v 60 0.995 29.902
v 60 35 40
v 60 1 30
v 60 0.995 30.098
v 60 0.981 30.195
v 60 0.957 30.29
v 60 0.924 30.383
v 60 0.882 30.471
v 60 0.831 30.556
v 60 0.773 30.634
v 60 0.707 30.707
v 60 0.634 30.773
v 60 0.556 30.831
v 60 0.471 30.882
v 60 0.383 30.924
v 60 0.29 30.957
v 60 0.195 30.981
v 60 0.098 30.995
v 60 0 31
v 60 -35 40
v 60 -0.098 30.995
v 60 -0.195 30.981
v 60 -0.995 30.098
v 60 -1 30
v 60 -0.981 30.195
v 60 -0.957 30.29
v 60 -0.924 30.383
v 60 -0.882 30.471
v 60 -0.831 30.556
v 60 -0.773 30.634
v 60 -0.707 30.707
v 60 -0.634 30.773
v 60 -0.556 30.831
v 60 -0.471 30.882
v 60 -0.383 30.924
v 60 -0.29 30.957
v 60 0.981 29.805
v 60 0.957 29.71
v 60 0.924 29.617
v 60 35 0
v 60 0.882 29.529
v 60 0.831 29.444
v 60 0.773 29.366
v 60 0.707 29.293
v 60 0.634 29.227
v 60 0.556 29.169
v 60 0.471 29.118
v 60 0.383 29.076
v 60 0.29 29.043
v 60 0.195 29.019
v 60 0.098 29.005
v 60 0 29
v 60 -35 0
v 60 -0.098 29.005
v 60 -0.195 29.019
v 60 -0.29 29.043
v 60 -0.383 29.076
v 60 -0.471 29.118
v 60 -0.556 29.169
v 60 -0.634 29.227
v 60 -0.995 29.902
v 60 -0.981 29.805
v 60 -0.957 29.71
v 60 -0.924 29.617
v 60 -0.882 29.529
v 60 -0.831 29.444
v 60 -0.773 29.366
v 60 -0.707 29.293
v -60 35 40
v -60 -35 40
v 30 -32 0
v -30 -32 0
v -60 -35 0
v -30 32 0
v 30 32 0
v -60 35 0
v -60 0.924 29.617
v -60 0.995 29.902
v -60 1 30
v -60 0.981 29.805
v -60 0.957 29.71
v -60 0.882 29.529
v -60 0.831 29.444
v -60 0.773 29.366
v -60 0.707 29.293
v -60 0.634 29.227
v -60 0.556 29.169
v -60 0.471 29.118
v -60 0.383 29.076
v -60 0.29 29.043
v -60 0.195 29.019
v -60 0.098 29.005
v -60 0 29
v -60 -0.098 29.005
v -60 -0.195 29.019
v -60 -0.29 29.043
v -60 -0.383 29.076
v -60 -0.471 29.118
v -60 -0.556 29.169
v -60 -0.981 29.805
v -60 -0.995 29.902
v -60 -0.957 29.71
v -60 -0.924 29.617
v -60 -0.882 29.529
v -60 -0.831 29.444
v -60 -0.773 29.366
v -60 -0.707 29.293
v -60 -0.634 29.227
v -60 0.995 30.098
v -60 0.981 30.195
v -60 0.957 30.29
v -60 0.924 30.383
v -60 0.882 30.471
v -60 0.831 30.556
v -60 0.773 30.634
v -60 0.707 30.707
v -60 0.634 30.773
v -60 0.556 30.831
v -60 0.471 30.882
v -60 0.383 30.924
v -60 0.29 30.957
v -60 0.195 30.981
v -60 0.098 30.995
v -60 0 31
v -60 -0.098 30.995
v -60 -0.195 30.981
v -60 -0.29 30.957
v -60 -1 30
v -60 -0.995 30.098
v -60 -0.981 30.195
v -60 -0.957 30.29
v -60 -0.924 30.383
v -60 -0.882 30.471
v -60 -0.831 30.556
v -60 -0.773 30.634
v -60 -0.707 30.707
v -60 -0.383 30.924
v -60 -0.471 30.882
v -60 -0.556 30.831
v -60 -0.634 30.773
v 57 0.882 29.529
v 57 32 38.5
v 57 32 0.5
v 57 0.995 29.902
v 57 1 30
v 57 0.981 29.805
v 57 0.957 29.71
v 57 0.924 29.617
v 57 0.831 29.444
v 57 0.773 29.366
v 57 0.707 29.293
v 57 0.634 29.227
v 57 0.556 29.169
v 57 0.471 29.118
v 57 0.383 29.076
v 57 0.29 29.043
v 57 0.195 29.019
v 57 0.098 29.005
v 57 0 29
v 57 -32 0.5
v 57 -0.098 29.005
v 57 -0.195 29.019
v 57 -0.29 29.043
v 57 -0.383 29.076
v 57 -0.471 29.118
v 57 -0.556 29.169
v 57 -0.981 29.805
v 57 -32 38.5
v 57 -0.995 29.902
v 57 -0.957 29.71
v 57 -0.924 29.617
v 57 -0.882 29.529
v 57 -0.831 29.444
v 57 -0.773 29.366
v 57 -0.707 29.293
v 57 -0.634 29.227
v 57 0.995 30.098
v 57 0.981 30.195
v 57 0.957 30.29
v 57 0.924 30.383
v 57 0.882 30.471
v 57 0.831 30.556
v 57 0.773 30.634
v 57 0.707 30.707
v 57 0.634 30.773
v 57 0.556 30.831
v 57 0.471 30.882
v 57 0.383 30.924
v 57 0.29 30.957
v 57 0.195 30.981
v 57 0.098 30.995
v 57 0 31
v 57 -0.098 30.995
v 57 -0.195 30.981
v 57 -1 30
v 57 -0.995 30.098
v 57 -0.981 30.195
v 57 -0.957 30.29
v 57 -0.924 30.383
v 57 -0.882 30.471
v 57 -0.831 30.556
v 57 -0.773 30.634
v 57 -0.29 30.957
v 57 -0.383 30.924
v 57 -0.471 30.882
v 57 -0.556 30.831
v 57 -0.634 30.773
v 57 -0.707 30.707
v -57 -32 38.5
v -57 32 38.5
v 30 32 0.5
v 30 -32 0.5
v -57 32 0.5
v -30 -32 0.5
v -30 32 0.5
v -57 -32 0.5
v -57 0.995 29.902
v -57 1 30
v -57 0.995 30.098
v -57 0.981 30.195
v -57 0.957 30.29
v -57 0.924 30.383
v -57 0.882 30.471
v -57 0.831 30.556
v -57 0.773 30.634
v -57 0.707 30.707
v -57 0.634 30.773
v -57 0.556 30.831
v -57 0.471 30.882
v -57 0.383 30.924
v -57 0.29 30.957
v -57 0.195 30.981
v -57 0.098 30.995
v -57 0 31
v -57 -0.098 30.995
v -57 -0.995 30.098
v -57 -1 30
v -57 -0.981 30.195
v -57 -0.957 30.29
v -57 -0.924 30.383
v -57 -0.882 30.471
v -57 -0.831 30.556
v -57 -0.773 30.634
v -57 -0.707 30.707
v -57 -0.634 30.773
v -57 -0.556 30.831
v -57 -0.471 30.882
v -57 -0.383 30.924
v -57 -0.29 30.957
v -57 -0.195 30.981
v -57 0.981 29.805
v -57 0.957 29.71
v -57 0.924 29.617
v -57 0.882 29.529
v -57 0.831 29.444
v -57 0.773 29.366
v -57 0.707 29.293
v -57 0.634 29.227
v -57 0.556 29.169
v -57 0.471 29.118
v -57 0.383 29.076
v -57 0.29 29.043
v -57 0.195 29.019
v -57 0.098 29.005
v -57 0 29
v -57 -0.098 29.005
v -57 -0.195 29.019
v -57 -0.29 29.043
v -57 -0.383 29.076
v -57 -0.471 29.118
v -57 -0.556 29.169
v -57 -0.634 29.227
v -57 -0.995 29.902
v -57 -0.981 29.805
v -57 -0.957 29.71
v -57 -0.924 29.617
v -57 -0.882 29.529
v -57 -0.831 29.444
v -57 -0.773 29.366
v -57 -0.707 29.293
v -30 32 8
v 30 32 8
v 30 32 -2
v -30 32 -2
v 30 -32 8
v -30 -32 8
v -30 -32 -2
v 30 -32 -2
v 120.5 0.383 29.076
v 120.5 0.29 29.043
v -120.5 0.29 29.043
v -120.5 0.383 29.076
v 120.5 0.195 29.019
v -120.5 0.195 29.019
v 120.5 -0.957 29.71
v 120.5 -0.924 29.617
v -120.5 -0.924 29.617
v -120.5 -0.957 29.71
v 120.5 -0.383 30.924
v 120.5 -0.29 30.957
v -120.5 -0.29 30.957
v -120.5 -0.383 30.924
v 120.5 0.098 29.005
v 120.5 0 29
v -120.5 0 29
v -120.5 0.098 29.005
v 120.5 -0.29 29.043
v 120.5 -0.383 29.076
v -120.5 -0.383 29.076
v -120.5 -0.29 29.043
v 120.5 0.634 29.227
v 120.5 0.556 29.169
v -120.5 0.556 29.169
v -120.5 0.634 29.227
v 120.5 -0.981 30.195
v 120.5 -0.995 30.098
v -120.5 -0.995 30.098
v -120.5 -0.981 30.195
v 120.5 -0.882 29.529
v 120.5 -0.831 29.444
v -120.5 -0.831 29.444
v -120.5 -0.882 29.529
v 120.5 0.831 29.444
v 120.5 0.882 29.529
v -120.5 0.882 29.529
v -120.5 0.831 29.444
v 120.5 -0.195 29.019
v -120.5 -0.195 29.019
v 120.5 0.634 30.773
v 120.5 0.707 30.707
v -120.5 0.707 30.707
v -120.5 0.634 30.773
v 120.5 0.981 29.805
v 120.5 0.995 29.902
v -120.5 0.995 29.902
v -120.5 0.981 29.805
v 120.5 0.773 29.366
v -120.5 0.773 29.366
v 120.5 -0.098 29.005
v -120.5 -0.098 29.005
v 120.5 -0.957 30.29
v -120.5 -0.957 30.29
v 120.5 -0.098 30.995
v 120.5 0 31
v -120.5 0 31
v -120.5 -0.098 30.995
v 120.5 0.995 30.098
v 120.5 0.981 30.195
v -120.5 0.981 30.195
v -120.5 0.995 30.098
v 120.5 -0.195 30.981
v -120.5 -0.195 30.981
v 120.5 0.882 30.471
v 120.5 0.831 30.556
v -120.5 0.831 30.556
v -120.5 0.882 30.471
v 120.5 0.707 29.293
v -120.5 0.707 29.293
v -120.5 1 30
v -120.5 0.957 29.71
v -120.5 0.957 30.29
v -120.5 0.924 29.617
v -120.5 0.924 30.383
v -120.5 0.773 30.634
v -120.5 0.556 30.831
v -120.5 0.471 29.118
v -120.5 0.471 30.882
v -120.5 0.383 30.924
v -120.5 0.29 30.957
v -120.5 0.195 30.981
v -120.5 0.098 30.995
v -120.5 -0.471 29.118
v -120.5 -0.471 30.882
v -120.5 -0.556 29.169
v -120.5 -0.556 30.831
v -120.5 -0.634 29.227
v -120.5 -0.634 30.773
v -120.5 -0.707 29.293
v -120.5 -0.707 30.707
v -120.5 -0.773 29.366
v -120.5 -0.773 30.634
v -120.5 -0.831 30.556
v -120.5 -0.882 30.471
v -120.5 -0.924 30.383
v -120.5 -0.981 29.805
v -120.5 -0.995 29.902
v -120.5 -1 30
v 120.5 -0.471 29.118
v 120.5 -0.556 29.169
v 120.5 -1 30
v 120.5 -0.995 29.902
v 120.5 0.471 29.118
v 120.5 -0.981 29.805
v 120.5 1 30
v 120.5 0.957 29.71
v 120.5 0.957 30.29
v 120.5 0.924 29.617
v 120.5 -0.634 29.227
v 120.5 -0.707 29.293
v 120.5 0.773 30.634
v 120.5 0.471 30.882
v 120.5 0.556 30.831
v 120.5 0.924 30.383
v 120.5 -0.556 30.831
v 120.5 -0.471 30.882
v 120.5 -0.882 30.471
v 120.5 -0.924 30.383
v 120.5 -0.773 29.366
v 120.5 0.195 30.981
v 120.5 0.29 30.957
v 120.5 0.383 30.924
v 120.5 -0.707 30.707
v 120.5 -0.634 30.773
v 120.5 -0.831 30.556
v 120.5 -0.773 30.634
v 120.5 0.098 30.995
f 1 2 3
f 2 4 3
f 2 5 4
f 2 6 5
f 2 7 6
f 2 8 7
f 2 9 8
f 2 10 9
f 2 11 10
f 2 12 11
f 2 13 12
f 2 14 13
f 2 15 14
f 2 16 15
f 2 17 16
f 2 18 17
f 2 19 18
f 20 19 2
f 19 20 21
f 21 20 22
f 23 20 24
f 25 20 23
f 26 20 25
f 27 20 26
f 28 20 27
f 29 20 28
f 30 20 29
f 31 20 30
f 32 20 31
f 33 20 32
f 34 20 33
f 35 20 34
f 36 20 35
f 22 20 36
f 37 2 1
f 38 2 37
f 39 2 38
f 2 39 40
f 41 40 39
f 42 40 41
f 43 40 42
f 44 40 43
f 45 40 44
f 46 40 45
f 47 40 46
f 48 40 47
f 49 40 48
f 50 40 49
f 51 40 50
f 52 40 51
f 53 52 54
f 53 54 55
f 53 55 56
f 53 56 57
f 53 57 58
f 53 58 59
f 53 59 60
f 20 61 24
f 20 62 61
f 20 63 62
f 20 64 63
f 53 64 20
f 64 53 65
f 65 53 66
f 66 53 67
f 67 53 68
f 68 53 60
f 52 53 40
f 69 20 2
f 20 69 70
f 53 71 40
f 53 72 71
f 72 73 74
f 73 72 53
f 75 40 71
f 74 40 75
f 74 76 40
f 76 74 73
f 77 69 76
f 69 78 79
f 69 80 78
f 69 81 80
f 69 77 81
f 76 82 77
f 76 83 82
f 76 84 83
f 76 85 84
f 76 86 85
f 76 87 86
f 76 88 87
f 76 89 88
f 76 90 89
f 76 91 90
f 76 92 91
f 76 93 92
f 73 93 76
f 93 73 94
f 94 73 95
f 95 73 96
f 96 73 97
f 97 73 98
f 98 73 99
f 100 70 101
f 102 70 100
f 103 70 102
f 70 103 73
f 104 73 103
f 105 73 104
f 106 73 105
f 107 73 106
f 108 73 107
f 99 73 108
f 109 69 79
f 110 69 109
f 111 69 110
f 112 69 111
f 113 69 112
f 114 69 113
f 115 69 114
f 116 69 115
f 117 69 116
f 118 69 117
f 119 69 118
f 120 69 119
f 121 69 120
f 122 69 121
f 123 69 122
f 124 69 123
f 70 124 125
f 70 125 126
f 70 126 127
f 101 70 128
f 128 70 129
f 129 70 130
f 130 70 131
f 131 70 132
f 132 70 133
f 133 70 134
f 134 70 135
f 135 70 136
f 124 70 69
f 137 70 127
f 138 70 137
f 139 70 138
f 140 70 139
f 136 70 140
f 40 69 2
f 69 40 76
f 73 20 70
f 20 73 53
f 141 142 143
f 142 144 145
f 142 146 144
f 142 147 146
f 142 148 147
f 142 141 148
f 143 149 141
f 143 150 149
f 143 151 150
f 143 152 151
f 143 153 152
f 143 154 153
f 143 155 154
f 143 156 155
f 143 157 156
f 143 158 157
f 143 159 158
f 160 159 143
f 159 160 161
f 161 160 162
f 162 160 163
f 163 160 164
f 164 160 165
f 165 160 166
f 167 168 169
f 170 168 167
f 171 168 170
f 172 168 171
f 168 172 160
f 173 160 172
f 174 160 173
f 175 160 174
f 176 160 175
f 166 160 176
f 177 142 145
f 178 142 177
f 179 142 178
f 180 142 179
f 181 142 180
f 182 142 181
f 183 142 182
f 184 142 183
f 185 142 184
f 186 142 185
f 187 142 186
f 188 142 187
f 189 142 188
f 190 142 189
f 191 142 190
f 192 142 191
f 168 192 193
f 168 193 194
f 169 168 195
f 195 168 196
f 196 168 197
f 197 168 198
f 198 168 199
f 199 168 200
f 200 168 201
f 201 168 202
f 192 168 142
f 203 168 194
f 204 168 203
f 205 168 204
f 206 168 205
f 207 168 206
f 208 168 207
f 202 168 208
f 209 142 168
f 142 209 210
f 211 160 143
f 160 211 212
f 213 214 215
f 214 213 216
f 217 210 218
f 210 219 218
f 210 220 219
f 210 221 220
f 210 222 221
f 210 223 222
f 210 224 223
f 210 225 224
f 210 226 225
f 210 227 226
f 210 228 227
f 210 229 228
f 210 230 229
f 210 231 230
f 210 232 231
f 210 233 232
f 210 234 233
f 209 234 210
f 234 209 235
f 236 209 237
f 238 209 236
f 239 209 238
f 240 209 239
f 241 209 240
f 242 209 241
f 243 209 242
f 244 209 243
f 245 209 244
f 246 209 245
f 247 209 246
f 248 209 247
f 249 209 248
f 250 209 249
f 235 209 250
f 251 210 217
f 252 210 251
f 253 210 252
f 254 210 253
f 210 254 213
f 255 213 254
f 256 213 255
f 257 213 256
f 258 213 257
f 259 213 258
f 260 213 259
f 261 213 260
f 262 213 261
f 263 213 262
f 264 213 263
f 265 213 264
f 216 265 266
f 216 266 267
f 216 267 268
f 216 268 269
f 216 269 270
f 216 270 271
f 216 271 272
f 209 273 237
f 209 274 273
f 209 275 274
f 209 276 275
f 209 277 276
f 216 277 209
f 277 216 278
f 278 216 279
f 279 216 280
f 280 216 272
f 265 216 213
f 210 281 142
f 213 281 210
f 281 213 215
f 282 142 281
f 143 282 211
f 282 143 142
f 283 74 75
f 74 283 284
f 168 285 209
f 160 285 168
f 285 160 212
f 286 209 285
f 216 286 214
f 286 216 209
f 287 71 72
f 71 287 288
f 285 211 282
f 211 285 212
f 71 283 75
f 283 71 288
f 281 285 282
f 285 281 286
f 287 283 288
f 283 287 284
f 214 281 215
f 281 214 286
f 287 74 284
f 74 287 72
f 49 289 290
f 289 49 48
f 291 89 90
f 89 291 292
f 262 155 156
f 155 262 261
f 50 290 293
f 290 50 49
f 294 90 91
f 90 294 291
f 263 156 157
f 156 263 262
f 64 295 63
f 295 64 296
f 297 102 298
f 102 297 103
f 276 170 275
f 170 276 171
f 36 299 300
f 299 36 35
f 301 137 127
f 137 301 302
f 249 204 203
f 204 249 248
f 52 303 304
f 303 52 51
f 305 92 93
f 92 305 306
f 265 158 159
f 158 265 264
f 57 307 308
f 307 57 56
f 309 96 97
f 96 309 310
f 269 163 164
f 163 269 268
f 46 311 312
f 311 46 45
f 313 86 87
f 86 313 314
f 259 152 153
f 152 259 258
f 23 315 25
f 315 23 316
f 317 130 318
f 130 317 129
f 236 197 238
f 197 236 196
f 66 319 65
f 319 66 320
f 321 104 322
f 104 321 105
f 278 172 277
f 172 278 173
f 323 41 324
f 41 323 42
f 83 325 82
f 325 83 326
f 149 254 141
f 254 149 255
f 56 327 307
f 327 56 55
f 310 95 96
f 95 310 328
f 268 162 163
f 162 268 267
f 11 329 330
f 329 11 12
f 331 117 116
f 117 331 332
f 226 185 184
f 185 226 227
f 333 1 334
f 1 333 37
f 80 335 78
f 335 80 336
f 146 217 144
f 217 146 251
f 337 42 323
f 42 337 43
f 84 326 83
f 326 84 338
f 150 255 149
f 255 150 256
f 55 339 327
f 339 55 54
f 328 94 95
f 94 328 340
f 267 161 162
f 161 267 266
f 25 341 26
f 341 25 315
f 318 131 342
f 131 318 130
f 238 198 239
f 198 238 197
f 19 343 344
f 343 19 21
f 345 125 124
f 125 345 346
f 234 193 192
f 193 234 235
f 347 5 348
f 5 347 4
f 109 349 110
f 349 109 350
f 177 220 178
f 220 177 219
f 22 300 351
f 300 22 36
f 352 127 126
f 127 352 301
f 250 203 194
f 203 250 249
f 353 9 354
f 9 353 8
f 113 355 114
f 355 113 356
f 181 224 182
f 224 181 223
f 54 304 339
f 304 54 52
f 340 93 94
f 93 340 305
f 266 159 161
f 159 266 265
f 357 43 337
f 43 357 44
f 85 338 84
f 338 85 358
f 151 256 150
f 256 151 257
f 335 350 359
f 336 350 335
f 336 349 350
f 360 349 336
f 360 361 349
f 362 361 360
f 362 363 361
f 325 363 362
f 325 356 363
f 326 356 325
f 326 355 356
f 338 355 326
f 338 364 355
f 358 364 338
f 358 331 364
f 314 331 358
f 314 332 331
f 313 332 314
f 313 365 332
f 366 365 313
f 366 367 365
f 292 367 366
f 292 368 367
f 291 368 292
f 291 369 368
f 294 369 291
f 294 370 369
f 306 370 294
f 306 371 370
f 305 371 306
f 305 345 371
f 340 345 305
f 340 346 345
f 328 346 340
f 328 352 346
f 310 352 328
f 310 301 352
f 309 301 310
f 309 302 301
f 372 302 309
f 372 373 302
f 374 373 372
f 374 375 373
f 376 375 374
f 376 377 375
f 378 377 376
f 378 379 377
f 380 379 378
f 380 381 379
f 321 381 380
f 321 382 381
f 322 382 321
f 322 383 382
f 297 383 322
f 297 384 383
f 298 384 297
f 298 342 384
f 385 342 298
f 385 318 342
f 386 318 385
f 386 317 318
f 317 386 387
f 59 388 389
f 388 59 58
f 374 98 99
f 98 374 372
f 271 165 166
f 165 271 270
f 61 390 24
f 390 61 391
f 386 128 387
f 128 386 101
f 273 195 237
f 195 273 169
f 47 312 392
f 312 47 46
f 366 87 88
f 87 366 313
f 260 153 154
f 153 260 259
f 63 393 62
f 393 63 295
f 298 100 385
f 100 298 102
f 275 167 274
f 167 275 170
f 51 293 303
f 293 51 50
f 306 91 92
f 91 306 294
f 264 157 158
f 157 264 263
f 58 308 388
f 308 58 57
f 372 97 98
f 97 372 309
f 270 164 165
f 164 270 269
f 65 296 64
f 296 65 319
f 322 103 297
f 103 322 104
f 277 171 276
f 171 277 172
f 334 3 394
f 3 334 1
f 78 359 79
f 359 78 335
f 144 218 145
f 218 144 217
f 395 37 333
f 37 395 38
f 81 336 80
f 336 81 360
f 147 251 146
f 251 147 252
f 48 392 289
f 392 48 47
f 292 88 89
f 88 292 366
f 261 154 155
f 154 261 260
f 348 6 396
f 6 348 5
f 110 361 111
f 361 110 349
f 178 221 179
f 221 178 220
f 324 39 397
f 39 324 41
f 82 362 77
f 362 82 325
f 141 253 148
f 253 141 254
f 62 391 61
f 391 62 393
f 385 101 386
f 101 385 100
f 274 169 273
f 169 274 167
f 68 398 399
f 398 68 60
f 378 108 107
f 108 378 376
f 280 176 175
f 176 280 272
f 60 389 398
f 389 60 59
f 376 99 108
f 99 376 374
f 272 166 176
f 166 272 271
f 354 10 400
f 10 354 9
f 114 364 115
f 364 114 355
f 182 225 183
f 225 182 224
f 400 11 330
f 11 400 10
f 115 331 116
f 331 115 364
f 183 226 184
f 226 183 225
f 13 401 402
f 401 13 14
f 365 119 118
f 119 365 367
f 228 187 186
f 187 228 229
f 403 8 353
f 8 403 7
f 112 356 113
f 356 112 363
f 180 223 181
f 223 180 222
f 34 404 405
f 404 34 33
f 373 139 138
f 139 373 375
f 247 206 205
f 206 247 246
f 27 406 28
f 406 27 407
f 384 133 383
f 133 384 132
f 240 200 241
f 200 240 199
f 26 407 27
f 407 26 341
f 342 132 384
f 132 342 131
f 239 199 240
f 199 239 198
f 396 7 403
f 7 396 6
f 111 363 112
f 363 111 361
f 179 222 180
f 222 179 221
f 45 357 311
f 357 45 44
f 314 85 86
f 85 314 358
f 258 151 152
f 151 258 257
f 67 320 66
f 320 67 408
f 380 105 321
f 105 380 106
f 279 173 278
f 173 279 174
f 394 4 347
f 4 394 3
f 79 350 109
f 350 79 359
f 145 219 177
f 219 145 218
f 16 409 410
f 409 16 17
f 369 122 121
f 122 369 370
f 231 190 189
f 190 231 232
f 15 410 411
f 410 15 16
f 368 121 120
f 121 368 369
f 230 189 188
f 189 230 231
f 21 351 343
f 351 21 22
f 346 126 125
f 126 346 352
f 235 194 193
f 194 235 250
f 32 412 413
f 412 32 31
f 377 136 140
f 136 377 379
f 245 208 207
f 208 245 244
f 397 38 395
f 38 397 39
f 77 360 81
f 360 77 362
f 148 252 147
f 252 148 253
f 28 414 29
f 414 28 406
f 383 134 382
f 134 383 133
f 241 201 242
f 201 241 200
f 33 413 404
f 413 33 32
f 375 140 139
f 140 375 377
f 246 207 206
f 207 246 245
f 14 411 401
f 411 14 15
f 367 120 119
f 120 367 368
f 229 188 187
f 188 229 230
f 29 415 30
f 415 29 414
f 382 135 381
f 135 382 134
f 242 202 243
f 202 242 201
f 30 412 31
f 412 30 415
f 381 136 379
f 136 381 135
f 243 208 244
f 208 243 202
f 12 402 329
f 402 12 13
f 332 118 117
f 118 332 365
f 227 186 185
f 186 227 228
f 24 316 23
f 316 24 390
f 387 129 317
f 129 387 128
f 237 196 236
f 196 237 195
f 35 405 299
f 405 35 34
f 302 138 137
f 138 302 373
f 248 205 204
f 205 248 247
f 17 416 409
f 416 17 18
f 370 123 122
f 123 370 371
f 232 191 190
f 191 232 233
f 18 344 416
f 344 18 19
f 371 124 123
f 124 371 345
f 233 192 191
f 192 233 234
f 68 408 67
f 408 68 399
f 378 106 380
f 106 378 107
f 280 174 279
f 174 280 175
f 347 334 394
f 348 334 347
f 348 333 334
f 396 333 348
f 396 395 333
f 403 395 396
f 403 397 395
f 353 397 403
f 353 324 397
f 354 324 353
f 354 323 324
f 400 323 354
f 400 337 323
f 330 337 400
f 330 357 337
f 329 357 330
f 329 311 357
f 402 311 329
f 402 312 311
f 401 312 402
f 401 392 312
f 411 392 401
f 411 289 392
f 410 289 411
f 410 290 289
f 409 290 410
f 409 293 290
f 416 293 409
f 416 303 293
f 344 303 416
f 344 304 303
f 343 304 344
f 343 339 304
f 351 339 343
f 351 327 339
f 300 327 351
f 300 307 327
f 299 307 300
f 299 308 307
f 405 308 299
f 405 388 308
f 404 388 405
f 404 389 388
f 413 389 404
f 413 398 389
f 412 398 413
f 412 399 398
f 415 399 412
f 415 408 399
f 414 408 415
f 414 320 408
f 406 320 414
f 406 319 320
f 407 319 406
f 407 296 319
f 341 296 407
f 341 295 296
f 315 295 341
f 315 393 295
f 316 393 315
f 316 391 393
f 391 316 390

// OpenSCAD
// Buffer tank for mini horizontal gel-electrophoresis box
// Dimensions measured with calipers

// Outer dimensions
outer_x = 120;
outer_y = 70;
outer_z = 40;

// Wall and floor thickness
wall_thickness = 3;
floor_thickness = 3;

// Inner dimensions (derived)
inner_x = outer_x - 2 * wall_thickness;
inner_y = outer_y - 2 * wall_thickness;
inner_z = outer_z - floor_thickness;

// Gel tray platform
platform_x = 60;
platform_y = inner_y; // spans full inner width
platform_z = 10; // height above inner floor
platform_z_top = floor_thickness + platform_z; // absolute z of top surface (13)

// Electrode wire holes
hole_diameter = 2;
hole_y = 0; // centred in Y
hole_z = 30; // absolute z

// Resolution for curved shapes
$fn = 64;

// Main tank body (outer shell minus inner cavity)
// Translate entire assembly so bottom is at z=0
translate([0, 0, outer_z/2]) {
    difference() {
        // Outer block
        cube([outer_x, outer_y, outer_z], center = true);
        
        // Inner cavity (open top)
        // Extends slightly below floor and above top to ensure clean cuts
        translate([0, 0, -0.5])
            cube([inner_x, inner_y, inner_z + 1], center = true);
    }
}

// Gel tray platform (solid raised structure in the middle)
// Centered in X and Y, sitting on the floor (z = floor_thickness)
translate([0, 0, floor_thickness])
    cube([platform_x, platform_y, platform_z], center = true);

// Electrode wire holes through end walls
// Left end wall hole
translate([-outer_x/2, hole_y, hole_z])
    rotate([0, 90, 0])
        cylinder(r = hole_diameter/2, h = outer_x + 1, center = true);

// Right end wall hole
translate([outer_x/2, hole_y, hole_z])
    rotate([0, 90, 0])
        cylinder(r = hole_diameter/2, h = outer_x + 1, center = true);
